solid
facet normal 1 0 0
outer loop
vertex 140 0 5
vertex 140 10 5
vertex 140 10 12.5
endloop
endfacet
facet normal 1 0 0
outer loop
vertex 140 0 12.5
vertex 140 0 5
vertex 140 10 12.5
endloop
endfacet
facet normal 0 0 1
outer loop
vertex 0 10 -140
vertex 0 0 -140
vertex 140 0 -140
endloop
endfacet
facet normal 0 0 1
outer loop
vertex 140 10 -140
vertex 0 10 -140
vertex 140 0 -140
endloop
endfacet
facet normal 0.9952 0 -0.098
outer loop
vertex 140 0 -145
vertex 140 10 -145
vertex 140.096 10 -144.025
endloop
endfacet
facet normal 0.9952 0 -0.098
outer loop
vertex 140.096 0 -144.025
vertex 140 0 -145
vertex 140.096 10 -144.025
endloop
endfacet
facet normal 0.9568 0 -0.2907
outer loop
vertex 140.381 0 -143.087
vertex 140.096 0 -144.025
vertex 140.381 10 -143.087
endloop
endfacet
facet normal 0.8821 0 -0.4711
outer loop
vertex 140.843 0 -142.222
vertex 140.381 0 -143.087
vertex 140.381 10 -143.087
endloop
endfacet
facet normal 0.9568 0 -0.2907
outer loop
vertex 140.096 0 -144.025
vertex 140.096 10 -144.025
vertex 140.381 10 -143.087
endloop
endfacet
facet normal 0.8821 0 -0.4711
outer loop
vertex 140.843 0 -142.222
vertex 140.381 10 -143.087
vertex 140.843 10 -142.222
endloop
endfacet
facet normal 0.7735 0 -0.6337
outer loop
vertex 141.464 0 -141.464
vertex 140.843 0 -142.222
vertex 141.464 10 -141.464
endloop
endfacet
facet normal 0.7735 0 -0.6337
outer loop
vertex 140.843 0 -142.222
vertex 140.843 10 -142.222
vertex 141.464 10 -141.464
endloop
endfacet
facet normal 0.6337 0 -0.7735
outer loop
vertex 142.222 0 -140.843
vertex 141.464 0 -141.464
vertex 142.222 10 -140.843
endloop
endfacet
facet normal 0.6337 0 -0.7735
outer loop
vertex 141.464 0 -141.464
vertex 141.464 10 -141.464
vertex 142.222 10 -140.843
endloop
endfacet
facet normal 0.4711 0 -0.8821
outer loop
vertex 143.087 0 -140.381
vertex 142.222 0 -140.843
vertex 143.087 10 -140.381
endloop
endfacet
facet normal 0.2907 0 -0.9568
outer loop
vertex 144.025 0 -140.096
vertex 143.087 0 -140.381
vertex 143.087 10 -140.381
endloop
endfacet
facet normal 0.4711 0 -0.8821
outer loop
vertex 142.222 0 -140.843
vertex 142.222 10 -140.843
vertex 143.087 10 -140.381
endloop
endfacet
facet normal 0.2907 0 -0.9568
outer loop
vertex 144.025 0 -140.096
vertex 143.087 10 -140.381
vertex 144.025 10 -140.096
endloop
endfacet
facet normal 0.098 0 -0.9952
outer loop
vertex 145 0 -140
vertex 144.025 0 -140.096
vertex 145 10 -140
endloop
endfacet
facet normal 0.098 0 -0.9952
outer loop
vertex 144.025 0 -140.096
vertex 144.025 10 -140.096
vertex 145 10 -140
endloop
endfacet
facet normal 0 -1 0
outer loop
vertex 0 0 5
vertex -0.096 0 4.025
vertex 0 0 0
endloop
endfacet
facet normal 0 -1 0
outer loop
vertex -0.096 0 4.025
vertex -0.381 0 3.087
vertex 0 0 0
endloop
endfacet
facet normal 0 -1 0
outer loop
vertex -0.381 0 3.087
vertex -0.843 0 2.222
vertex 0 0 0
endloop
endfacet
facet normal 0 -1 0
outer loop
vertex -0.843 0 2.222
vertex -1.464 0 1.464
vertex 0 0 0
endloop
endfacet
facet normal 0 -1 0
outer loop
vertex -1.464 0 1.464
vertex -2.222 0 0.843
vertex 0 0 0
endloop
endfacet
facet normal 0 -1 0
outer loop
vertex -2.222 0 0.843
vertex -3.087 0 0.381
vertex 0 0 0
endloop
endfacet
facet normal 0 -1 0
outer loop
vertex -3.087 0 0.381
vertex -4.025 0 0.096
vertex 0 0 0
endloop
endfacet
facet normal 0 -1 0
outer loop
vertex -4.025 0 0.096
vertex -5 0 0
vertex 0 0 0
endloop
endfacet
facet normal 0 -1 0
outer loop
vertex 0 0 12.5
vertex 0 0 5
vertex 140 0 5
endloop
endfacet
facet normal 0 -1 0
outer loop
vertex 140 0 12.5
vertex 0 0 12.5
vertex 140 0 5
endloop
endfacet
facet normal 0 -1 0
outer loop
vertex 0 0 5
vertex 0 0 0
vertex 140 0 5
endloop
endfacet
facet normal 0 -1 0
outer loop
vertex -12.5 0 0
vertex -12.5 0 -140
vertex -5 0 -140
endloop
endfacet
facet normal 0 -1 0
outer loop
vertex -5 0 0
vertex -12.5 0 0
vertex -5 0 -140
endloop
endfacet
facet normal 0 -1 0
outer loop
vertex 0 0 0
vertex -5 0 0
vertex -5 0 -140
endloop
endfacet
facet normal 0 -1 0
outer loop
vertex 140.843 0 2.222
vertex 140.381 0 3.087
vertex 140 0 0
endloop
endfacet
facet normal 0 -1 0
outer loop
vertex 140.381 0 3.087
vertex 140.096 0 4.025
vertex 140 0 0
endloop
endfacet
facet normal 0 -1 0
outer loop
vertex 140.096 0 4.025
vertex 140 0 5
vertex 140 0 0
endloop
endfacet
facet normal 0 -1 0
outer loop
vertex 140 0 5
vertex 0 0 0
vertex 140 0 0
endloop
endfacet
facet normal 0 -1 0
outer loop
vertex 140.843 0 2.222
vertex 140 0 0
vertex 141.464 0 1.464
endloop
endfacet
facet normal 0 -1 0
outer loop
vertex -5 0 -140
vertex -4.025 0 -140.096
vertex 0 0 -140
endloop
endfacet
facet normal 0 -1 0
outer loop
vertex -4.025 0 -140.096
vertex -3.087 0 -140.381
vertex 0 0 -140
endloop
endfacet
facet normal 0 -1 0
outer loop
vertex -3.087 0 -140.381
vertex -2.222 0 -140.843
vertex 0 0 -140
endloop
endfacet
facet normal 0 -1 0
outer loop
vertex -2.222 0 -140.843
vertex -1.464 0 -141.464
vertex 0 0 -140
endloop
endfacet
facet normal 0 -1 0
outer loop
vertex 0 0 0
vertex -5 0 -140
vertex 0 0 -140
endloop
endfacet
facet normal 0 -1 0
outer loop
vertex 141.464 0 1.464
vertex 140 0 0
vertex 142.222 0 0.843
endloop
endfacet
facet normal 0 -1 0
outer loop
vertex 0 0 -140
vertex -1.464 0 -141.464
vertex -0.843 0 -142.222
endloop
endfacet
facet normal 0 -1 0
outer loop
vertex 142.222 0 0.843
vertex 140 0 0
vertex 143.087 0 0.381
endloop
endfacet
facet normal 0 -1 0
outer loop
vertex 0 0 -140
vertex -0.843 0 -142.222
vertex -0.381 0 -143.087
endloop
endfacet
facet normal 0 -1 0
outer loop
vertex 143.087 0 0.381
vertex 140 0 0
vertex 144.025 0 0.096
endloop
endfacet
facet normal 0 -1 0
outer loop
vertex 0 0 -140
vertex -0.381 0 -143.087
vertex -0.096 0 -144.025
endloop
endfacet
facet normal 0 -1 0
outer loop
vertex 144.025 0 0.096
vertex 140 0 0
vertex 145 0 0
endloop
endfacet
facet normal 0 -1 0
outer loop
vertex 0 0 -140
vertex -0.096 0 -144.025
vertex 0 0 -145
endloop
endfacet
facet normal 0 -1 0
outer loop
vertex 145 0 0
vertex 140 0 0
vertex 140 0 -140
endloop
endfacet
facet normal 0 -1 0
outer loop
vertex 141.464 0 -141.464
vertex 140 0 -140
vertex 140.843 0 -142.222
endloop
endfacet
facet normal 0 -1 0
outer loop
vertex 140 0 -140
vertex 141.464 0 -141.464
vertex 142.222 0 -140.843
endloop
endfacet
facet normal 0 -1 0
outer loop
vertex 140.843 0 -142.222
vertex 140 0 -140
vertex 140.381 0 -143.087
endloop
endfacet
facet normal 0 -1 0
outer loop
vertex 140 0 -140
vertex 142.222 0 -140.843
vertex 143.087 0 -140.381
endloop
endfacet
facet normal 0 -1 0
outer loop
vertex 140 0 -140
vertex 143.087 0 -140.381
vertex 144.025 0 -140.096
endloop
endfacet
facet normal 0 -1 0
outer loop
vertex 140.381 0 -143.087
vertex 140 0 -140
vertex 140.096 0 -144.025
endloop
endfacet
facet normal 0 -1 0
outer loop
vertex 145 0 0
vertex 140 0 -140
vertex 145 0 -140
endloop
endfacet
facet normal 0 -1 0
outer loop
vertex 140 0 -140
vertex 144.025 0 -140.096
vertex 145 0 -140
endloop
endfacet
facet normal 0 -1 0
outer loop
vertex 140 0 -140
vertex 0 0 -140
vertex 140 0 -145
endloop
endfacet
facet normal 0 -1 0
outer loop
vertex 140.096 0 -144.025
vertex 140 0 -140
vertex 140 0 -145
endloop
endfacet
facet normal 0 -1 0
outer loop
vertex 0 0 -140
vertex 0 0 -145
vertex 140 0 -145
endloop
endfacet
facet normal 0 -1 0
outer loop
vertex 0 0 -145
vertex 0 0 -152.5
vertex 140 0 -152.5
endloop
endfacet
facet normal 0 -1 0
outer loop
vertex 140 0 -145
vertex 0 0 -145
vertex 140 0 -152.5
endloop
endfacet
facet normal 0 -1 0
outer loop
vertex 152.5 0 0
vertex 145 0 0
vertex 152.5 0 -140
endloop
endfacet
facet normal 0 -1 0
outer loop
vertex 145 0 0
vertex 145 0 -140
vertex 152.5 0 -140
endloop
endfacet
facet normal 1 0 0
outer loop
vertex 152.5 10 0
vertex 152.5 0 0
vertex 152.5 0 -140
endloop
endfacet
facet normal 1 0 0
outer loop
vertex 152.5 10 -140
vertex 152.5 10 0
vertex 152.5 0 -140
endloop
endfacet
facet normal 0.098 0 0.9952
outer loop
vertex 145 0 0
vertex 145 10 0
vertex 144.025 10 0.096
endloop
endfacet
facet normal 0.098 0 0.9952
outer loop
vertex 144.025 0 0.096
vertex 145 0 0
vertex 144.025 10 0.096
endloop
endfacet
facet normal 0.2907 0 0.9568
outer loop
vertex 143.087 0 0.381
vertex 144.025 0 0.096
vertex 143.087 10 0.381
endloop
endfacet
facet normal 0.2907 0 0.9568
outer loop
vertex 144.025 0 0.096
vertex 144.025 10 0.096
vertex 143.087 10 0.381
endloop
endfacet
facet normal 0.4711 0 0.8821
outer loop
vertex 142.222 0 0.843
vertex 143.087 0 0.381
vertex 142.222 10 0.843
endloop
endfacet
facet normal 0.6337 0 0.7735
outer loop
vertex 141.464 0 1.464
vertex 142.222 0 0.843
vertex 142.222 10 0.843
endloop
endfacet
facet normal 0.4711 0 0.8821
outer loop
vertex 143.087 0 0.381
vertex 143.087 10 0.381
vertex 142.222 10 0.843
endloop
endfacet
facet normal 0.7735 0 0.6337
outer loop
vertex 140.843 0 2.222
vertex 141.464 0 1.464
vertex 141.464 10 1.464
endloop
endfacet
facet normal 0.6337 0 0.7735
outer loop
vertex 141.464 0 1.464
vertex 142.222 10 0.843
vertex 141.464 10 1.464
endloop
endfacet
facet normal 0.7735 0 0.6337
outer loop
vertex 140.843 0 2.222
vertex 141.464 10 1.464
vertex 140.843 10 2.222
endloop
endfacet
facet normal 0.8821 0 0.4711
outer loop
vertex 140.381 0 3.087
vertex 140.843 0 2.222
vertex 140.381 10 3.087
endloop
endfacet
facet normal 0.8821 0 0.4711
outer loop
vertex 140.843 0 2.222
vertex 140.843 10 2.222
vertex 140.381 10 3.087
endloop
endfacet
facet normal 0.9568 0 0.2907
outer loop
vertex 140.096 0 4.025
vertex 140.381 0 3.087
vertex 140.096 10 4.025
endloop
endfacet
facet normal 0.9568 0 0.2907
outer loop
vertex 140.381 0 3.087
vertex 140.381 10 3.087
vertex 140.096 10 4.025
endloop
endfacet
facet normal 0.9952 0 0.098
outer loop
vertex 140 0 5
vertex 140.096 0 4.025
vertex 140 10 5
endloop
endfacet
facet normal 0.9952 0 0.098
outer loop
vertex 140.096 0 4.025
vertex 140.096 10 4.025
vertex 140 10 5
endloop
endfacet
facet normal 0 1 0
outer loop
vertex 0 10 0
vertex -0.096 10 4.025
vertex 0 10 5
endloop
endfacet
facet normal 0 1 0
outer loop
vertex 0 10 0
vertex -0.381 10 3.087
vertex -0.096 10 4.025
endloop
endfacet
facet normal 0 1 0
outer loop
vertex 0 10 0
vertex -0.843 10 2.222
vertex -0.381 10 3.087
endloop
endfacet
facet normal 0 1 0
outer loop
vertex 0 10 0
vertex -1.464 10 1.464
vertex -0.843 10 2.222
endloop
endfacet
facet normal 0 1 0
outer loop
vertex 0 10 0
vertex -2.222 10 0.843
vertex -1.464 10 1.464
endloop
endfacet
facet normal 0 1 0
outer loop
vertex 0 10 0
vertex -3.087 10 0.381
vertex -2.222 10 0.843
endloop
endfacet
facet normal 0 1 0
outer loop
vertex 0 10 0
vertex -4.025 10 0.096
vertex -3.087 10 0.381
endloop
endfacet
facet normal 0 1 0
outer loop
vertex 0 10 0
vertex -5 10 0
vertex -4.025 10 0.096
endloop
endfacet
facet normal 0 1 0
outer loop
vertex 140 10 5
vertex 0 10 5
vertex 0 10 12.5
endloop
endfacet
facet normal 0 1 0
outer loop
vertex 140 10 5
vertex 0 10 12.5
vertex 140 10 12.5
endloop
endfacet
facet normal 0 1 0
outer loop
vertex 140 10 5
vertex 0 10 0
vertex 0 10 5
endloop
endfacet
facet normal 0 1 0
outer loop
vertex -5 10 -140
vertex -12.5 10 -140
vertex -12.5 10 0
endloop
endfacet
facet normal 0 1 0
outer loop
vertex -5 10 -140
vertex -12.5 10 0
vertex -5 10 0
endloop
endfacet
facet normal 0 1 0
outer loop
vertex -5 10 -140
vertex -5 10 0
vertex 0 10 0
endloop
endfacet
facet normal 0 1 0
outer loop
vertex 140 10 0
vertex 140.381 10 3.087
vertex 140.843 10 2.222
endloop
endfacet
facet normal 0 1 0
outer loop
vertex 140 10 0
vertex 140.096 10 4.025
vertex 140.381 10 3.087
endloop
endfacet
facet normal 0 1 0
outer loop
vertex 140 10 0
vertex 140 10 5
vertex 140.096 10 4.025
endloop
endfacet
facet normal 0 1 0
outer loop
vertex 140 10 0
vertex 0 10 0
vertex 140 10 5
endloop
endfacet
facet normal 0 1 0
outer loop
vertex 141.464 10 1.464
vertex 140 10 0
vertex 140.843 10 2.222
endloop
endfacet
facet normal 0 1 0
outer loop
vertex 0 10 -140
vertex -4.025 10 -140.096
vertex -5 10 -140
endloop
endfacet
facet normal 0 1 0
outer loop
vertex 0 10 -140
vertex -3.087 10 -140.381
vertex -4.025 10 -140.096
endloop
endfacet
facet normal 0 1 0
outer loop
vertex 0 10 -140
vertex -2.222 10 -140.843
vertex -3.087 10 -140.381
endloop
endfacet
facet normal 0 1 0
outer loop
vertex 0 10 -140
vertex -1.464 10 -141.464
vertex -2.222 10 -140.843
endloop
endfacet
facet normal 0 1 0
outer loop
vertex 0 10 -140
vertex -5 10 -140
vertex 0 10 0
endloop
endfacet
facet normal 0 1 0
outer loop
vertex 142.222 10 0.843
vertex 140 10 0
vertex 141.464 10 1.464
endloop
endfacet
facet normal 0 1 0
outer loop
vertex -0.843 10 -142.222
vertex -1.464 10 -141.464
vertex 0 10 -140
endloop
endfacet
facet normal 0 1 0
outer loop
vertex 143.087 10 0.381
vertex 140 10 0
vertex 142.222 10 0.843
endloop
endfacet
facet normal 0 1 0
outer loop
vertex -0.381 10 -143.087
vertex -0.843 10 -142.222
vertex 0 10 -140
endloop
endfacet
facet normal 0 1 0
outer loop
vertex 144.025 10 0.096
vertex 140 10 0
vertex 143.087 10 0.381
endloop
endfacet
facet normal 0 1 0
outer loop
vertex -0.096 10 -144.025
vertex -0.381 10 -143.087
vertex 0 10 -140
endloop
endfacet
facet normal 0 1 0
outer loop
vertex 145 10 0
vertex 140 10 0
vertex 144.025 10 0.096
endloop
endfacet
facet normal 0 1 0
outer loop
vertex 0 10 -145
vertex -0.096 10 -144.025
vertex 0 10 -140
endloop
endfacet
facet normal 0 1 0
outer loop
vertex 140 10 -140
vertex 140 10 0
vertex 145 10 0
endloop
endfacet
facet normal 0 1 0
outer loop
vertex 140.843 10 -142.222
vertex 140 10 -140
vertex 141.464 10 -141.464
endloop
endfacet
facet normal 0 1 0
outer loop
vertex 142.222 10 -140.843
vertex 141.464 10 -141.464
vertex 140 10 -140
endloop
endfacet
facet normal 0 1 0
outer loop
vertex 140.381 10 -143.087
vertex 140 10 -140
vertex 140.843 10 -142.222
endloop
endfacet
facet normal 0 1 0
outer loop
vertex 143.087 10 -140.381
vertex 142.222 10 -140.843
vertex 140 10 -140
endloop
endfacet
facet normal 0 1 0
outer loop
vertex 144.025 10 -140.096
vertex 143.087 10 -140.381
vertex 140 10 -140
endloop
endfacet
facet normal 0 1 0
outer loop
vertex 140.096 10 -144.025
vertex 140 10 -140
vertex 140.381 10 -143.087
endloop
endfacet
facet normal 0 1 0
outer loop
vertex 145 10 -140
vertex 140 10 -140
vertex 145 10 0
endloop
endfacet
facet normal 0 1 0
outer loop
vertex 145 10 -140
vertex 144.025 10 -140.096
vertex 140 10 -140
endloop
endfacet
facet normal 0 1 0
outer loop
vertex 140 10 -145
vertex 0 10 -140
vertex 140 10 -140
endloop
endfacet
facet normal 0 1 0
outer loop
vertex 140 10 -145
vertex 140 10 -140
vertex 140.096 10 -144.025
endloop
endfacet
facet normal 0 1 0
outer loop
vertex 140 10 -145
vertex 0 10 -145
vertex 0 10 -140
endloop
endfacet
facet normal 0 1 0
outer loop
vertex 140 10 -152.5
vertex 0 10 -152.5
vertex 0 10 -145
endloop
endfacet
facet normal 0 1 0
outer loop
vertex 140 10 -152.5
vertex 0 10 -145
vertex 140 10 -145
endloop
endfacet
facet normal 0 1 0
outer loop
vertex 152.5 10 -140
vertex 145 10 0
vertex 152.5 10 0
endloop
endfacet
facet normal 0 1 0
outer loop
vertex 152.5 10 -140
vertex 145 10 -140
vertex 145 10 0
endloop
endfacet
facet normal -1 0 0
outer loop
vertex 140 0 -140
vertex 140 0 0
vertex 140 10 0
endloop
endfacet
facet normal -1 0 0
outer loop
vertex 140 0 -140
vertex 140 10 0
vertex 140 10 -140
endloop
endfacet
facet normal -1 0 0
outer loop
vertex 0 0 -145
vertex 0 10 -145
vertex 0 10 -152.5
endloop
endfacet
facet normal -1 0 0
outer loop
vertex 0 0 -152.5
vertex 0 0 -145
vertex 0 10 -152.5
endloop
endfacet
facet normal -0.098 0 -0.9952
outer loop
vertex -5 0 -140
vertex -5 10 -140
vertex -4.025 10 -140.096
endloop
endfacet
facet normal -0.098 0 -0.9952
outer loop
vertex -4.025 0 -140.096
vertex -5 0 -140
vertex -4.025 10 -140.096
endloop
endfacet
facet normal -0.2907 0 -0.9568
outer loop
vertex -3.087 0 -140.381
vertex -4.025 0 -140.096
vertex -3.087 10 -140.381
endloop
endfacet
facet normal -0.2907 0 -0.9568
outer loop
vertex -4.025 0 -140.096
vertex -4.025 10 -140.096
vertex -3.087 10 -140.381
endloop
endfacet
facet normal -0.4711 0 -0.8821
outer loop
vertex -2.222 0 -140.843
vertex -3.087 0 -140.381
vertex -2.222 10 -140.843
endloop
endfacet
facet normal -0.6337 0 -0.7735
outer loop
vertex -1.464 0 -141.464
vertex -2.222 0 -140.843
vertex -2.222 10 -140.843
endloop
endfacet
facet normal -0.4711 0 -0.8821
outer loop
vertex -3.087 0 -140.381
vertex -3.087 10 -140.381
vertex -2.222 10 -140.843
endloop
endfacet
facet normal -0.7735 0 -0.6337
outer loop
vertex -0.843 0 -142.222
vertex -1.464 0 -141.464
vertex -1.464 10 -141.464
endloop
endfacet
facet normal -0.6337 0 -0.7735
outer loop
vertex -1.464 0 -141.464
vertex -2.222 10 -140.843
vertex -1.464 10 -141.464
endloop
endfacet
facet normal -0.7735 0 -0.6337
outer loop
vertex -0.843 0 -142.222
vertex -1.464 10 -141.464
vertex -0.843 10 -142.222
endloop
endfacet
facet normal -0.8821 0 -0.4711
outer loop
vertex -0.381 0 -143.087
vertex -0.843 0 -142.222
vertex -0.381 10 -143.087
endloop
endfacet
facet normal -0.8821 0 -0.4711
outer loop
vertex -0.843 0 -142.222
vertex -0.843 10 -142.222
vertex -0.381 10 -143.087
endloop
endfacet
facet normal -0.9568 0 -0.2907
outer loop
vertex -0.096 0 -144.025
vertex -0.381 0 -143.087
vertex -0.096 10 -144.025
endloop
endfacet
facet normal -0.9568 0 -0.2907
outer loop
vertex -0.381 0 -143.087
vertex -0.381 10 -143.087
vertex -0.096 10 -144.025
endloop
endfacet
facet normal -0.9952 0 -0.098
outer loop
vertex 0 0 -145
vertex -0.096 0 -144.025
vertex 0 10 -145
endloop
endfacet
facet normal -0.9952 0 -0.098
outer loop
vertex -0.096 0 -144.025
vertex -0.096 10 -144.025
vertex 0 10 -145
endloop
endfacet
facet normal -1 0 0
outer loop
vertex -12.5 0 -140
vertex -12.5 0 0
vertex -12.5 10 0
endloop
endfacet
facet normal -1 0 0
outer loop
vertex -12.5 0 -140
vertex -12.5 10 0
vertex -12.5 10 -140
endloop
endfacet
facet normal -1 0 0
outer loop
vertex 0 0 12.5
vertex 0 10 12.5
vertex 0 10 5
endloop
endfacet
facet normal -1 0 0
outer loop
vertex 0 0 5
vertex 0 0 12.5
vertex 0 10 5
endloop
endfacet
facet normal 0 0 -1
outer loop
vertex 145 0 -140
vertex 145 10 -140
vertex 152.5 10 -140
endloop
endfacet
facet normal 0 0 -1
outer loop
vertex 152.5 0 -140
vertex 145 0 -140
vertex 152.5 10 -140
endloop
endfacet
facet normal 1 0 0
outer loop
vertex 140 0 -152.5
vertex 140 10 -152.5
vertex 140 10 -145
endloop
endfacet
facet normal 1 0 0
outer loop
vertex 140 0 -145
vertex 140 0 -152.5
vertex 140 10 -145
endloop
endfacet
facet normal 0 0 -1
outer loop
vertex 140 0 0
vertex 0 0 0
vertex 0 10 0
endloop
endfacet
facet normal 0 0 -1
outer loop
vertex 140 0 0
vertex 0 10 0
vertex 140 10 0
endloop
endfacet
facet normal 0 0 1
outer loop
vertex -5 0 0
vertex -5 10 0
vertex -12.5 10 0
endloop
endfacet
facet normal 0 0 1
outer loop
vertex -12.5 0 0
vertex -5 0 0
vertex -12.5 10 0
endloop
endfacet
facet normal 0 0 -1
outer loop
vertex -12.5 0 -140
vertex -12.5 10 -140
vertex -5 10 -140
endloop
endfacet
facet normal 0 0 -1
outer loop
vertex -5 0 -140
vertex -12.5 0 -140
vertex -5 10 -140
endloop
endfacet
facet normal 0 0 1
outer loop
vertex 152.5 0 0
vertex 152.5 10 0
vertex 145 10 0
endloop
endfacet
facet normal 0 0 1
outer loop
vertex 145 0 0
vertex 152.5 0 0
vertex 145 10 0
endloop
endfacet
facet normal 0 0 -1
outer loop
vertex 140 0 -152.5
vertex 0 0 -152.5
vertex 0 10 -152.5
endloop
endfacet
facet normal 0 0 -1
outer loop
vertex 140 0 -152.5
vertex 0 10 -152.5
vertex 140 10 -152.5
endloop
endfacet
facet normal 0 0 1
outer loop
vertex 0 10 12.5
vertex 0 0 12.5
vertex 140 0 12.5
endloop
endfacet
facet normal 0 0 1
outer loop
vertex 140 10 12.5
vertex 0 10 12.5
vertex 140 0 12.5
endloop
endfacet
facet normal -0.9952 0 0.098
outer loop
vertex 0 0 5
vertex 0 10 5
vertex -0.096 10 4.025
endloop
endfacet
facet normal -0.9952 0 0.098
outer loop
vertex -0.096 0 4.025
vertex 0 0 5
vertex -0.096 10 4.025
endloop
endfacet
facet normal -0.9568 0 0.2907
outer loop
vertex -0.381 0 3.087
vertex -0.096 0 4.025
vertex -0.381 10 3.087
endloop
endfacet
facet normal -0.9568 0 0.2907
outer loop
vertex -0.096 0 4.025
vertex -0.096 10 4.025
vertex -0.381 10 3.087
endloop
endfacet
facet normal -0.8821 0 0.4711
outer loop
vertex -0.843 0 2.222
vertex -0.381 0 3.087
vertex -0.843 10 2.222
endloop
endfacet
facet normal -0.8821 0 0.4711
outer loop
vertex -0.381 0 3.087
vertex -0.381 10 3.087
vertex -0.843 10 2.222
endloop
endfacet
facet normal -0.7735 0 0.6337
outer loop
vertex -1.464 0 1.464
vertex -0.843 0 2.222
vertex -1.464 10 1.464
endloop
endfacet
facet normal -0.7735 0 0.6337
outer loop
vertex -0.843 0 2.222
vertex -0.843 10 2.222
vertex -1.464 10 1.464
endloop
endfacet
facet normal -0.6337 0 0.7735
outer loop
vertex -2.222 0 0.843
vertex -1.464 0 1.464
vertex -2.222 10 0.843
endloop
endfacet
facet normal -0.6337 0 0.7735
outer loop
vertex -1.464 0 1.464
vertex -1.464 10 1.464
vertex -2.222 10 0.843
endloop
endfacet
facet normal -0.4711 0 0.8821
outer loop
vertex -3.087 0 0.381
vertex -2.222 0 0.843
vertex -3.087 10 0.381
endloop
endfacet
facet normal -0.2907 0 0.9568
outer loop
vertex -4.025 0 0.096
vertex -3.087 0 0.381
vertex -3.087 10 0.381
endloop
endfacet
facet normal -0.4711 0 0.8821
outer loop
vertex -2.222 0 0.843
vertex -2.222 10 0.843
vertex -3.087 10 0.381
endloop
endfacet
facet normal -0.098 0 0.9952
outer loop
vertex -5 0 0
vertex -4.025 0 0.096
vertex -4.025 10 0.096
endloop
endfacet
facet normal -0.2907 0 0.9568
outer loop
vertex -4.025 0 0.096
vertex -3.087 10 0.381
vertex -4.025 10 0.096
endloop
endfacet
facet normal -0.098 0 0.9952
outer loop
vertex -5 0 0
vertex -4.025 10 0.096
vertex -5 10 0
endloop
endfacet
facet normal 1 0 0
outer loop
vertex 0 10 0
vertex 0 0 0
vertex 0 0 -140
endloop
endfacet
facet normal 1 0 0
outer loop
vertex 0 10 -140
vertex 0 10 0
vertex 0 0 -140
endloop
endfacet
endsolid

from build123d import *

# Parameters (mm, degrees)
CROQUIS1_W              = 165
CROQUIS1_H              = 165
CROQUIS1_W_2            = 140
CROQUIS1_H_2            = 140
SALIENTE_EXTRUIR1_DEPTH = 10
CORTAR_EXTRUIR1_DEPTH   = 10


with BuildPart() as part:
    # Croquis1 → Saliente-Extruir1 (new body)
    with BuildSketch(Plane(origin=(0, 0, 0), x_dir=(1, 0, 0), z_dir=(0, 1, 0))):
        with Locations((70, 70)):
            Rectangle(CROQUIS1_W, CROQUIS1_H)
        with Locations((70, 70)):
            Rectangle(CROQUIS1_W_2, CROQUIS1_H_2, mode=Mode.SUBTRACT)
    extrude(amount=SALIENTE_EXTRUIR1_DEPTH)

    # Croquis2 → Cortar-Extruir1 (cut)
    with BuildSketch(Plane(origin=(0, 10, 0), x_dir=(1, 0, 0), z_dir=(0, 1, 0))):
        with BuildLine():
            Line((0, 145), (0, 152.5))
            Line((0, 152.5), (-12.5, 152.5))
            Line((-12.5, 152.5), (-12.5, 140))
            Line((-12.5, 140), (-5, 140))
            ThreePointArc((-5, 140), (-1.464466094, 141.464466094), (0, 145))
        make_face()
        with BuildLine():
            Line((145, 140), (152.5, 140))
            Line((152.5, 140), (152.5, 152.5))
            Line((152.5, 152.5), (140, 152.5))
            Line((140, 152.5), (140, 145))
            ThreePointArc((140, 145), (141.464466094, 141.464466094), (145, 140))
        make_face()
        with BuildLine():
            Line((140, -5), (140, -12.5))
            Line((140, -12.5), (152.5, -12.5))
            Line((152.5, -12.5), (152.5, 0))
            Line((152.5, 0), (145, 0))
            ThreePointArc((145, 0), (141.464466094, -1.464466094), (140, -5))
        make_face()
        with BuildLine():
            Line((-5, 0), (-12.5, 0))
            Line((-12.5, 0), (-12.5, -12.5))
            Line((-12.5, -12.5), (0, -12.5))
            Line((0, -12.5), (0, -5))
            ThreePointArc((0, -5), (-1.464466094, -1.464466094), (-5, 0))
        make_face()
    extrude(amount=-CORTAR_EXTRUIR1_DEPTH, mode=Mode.SUBTRACT)


solid = part.part
